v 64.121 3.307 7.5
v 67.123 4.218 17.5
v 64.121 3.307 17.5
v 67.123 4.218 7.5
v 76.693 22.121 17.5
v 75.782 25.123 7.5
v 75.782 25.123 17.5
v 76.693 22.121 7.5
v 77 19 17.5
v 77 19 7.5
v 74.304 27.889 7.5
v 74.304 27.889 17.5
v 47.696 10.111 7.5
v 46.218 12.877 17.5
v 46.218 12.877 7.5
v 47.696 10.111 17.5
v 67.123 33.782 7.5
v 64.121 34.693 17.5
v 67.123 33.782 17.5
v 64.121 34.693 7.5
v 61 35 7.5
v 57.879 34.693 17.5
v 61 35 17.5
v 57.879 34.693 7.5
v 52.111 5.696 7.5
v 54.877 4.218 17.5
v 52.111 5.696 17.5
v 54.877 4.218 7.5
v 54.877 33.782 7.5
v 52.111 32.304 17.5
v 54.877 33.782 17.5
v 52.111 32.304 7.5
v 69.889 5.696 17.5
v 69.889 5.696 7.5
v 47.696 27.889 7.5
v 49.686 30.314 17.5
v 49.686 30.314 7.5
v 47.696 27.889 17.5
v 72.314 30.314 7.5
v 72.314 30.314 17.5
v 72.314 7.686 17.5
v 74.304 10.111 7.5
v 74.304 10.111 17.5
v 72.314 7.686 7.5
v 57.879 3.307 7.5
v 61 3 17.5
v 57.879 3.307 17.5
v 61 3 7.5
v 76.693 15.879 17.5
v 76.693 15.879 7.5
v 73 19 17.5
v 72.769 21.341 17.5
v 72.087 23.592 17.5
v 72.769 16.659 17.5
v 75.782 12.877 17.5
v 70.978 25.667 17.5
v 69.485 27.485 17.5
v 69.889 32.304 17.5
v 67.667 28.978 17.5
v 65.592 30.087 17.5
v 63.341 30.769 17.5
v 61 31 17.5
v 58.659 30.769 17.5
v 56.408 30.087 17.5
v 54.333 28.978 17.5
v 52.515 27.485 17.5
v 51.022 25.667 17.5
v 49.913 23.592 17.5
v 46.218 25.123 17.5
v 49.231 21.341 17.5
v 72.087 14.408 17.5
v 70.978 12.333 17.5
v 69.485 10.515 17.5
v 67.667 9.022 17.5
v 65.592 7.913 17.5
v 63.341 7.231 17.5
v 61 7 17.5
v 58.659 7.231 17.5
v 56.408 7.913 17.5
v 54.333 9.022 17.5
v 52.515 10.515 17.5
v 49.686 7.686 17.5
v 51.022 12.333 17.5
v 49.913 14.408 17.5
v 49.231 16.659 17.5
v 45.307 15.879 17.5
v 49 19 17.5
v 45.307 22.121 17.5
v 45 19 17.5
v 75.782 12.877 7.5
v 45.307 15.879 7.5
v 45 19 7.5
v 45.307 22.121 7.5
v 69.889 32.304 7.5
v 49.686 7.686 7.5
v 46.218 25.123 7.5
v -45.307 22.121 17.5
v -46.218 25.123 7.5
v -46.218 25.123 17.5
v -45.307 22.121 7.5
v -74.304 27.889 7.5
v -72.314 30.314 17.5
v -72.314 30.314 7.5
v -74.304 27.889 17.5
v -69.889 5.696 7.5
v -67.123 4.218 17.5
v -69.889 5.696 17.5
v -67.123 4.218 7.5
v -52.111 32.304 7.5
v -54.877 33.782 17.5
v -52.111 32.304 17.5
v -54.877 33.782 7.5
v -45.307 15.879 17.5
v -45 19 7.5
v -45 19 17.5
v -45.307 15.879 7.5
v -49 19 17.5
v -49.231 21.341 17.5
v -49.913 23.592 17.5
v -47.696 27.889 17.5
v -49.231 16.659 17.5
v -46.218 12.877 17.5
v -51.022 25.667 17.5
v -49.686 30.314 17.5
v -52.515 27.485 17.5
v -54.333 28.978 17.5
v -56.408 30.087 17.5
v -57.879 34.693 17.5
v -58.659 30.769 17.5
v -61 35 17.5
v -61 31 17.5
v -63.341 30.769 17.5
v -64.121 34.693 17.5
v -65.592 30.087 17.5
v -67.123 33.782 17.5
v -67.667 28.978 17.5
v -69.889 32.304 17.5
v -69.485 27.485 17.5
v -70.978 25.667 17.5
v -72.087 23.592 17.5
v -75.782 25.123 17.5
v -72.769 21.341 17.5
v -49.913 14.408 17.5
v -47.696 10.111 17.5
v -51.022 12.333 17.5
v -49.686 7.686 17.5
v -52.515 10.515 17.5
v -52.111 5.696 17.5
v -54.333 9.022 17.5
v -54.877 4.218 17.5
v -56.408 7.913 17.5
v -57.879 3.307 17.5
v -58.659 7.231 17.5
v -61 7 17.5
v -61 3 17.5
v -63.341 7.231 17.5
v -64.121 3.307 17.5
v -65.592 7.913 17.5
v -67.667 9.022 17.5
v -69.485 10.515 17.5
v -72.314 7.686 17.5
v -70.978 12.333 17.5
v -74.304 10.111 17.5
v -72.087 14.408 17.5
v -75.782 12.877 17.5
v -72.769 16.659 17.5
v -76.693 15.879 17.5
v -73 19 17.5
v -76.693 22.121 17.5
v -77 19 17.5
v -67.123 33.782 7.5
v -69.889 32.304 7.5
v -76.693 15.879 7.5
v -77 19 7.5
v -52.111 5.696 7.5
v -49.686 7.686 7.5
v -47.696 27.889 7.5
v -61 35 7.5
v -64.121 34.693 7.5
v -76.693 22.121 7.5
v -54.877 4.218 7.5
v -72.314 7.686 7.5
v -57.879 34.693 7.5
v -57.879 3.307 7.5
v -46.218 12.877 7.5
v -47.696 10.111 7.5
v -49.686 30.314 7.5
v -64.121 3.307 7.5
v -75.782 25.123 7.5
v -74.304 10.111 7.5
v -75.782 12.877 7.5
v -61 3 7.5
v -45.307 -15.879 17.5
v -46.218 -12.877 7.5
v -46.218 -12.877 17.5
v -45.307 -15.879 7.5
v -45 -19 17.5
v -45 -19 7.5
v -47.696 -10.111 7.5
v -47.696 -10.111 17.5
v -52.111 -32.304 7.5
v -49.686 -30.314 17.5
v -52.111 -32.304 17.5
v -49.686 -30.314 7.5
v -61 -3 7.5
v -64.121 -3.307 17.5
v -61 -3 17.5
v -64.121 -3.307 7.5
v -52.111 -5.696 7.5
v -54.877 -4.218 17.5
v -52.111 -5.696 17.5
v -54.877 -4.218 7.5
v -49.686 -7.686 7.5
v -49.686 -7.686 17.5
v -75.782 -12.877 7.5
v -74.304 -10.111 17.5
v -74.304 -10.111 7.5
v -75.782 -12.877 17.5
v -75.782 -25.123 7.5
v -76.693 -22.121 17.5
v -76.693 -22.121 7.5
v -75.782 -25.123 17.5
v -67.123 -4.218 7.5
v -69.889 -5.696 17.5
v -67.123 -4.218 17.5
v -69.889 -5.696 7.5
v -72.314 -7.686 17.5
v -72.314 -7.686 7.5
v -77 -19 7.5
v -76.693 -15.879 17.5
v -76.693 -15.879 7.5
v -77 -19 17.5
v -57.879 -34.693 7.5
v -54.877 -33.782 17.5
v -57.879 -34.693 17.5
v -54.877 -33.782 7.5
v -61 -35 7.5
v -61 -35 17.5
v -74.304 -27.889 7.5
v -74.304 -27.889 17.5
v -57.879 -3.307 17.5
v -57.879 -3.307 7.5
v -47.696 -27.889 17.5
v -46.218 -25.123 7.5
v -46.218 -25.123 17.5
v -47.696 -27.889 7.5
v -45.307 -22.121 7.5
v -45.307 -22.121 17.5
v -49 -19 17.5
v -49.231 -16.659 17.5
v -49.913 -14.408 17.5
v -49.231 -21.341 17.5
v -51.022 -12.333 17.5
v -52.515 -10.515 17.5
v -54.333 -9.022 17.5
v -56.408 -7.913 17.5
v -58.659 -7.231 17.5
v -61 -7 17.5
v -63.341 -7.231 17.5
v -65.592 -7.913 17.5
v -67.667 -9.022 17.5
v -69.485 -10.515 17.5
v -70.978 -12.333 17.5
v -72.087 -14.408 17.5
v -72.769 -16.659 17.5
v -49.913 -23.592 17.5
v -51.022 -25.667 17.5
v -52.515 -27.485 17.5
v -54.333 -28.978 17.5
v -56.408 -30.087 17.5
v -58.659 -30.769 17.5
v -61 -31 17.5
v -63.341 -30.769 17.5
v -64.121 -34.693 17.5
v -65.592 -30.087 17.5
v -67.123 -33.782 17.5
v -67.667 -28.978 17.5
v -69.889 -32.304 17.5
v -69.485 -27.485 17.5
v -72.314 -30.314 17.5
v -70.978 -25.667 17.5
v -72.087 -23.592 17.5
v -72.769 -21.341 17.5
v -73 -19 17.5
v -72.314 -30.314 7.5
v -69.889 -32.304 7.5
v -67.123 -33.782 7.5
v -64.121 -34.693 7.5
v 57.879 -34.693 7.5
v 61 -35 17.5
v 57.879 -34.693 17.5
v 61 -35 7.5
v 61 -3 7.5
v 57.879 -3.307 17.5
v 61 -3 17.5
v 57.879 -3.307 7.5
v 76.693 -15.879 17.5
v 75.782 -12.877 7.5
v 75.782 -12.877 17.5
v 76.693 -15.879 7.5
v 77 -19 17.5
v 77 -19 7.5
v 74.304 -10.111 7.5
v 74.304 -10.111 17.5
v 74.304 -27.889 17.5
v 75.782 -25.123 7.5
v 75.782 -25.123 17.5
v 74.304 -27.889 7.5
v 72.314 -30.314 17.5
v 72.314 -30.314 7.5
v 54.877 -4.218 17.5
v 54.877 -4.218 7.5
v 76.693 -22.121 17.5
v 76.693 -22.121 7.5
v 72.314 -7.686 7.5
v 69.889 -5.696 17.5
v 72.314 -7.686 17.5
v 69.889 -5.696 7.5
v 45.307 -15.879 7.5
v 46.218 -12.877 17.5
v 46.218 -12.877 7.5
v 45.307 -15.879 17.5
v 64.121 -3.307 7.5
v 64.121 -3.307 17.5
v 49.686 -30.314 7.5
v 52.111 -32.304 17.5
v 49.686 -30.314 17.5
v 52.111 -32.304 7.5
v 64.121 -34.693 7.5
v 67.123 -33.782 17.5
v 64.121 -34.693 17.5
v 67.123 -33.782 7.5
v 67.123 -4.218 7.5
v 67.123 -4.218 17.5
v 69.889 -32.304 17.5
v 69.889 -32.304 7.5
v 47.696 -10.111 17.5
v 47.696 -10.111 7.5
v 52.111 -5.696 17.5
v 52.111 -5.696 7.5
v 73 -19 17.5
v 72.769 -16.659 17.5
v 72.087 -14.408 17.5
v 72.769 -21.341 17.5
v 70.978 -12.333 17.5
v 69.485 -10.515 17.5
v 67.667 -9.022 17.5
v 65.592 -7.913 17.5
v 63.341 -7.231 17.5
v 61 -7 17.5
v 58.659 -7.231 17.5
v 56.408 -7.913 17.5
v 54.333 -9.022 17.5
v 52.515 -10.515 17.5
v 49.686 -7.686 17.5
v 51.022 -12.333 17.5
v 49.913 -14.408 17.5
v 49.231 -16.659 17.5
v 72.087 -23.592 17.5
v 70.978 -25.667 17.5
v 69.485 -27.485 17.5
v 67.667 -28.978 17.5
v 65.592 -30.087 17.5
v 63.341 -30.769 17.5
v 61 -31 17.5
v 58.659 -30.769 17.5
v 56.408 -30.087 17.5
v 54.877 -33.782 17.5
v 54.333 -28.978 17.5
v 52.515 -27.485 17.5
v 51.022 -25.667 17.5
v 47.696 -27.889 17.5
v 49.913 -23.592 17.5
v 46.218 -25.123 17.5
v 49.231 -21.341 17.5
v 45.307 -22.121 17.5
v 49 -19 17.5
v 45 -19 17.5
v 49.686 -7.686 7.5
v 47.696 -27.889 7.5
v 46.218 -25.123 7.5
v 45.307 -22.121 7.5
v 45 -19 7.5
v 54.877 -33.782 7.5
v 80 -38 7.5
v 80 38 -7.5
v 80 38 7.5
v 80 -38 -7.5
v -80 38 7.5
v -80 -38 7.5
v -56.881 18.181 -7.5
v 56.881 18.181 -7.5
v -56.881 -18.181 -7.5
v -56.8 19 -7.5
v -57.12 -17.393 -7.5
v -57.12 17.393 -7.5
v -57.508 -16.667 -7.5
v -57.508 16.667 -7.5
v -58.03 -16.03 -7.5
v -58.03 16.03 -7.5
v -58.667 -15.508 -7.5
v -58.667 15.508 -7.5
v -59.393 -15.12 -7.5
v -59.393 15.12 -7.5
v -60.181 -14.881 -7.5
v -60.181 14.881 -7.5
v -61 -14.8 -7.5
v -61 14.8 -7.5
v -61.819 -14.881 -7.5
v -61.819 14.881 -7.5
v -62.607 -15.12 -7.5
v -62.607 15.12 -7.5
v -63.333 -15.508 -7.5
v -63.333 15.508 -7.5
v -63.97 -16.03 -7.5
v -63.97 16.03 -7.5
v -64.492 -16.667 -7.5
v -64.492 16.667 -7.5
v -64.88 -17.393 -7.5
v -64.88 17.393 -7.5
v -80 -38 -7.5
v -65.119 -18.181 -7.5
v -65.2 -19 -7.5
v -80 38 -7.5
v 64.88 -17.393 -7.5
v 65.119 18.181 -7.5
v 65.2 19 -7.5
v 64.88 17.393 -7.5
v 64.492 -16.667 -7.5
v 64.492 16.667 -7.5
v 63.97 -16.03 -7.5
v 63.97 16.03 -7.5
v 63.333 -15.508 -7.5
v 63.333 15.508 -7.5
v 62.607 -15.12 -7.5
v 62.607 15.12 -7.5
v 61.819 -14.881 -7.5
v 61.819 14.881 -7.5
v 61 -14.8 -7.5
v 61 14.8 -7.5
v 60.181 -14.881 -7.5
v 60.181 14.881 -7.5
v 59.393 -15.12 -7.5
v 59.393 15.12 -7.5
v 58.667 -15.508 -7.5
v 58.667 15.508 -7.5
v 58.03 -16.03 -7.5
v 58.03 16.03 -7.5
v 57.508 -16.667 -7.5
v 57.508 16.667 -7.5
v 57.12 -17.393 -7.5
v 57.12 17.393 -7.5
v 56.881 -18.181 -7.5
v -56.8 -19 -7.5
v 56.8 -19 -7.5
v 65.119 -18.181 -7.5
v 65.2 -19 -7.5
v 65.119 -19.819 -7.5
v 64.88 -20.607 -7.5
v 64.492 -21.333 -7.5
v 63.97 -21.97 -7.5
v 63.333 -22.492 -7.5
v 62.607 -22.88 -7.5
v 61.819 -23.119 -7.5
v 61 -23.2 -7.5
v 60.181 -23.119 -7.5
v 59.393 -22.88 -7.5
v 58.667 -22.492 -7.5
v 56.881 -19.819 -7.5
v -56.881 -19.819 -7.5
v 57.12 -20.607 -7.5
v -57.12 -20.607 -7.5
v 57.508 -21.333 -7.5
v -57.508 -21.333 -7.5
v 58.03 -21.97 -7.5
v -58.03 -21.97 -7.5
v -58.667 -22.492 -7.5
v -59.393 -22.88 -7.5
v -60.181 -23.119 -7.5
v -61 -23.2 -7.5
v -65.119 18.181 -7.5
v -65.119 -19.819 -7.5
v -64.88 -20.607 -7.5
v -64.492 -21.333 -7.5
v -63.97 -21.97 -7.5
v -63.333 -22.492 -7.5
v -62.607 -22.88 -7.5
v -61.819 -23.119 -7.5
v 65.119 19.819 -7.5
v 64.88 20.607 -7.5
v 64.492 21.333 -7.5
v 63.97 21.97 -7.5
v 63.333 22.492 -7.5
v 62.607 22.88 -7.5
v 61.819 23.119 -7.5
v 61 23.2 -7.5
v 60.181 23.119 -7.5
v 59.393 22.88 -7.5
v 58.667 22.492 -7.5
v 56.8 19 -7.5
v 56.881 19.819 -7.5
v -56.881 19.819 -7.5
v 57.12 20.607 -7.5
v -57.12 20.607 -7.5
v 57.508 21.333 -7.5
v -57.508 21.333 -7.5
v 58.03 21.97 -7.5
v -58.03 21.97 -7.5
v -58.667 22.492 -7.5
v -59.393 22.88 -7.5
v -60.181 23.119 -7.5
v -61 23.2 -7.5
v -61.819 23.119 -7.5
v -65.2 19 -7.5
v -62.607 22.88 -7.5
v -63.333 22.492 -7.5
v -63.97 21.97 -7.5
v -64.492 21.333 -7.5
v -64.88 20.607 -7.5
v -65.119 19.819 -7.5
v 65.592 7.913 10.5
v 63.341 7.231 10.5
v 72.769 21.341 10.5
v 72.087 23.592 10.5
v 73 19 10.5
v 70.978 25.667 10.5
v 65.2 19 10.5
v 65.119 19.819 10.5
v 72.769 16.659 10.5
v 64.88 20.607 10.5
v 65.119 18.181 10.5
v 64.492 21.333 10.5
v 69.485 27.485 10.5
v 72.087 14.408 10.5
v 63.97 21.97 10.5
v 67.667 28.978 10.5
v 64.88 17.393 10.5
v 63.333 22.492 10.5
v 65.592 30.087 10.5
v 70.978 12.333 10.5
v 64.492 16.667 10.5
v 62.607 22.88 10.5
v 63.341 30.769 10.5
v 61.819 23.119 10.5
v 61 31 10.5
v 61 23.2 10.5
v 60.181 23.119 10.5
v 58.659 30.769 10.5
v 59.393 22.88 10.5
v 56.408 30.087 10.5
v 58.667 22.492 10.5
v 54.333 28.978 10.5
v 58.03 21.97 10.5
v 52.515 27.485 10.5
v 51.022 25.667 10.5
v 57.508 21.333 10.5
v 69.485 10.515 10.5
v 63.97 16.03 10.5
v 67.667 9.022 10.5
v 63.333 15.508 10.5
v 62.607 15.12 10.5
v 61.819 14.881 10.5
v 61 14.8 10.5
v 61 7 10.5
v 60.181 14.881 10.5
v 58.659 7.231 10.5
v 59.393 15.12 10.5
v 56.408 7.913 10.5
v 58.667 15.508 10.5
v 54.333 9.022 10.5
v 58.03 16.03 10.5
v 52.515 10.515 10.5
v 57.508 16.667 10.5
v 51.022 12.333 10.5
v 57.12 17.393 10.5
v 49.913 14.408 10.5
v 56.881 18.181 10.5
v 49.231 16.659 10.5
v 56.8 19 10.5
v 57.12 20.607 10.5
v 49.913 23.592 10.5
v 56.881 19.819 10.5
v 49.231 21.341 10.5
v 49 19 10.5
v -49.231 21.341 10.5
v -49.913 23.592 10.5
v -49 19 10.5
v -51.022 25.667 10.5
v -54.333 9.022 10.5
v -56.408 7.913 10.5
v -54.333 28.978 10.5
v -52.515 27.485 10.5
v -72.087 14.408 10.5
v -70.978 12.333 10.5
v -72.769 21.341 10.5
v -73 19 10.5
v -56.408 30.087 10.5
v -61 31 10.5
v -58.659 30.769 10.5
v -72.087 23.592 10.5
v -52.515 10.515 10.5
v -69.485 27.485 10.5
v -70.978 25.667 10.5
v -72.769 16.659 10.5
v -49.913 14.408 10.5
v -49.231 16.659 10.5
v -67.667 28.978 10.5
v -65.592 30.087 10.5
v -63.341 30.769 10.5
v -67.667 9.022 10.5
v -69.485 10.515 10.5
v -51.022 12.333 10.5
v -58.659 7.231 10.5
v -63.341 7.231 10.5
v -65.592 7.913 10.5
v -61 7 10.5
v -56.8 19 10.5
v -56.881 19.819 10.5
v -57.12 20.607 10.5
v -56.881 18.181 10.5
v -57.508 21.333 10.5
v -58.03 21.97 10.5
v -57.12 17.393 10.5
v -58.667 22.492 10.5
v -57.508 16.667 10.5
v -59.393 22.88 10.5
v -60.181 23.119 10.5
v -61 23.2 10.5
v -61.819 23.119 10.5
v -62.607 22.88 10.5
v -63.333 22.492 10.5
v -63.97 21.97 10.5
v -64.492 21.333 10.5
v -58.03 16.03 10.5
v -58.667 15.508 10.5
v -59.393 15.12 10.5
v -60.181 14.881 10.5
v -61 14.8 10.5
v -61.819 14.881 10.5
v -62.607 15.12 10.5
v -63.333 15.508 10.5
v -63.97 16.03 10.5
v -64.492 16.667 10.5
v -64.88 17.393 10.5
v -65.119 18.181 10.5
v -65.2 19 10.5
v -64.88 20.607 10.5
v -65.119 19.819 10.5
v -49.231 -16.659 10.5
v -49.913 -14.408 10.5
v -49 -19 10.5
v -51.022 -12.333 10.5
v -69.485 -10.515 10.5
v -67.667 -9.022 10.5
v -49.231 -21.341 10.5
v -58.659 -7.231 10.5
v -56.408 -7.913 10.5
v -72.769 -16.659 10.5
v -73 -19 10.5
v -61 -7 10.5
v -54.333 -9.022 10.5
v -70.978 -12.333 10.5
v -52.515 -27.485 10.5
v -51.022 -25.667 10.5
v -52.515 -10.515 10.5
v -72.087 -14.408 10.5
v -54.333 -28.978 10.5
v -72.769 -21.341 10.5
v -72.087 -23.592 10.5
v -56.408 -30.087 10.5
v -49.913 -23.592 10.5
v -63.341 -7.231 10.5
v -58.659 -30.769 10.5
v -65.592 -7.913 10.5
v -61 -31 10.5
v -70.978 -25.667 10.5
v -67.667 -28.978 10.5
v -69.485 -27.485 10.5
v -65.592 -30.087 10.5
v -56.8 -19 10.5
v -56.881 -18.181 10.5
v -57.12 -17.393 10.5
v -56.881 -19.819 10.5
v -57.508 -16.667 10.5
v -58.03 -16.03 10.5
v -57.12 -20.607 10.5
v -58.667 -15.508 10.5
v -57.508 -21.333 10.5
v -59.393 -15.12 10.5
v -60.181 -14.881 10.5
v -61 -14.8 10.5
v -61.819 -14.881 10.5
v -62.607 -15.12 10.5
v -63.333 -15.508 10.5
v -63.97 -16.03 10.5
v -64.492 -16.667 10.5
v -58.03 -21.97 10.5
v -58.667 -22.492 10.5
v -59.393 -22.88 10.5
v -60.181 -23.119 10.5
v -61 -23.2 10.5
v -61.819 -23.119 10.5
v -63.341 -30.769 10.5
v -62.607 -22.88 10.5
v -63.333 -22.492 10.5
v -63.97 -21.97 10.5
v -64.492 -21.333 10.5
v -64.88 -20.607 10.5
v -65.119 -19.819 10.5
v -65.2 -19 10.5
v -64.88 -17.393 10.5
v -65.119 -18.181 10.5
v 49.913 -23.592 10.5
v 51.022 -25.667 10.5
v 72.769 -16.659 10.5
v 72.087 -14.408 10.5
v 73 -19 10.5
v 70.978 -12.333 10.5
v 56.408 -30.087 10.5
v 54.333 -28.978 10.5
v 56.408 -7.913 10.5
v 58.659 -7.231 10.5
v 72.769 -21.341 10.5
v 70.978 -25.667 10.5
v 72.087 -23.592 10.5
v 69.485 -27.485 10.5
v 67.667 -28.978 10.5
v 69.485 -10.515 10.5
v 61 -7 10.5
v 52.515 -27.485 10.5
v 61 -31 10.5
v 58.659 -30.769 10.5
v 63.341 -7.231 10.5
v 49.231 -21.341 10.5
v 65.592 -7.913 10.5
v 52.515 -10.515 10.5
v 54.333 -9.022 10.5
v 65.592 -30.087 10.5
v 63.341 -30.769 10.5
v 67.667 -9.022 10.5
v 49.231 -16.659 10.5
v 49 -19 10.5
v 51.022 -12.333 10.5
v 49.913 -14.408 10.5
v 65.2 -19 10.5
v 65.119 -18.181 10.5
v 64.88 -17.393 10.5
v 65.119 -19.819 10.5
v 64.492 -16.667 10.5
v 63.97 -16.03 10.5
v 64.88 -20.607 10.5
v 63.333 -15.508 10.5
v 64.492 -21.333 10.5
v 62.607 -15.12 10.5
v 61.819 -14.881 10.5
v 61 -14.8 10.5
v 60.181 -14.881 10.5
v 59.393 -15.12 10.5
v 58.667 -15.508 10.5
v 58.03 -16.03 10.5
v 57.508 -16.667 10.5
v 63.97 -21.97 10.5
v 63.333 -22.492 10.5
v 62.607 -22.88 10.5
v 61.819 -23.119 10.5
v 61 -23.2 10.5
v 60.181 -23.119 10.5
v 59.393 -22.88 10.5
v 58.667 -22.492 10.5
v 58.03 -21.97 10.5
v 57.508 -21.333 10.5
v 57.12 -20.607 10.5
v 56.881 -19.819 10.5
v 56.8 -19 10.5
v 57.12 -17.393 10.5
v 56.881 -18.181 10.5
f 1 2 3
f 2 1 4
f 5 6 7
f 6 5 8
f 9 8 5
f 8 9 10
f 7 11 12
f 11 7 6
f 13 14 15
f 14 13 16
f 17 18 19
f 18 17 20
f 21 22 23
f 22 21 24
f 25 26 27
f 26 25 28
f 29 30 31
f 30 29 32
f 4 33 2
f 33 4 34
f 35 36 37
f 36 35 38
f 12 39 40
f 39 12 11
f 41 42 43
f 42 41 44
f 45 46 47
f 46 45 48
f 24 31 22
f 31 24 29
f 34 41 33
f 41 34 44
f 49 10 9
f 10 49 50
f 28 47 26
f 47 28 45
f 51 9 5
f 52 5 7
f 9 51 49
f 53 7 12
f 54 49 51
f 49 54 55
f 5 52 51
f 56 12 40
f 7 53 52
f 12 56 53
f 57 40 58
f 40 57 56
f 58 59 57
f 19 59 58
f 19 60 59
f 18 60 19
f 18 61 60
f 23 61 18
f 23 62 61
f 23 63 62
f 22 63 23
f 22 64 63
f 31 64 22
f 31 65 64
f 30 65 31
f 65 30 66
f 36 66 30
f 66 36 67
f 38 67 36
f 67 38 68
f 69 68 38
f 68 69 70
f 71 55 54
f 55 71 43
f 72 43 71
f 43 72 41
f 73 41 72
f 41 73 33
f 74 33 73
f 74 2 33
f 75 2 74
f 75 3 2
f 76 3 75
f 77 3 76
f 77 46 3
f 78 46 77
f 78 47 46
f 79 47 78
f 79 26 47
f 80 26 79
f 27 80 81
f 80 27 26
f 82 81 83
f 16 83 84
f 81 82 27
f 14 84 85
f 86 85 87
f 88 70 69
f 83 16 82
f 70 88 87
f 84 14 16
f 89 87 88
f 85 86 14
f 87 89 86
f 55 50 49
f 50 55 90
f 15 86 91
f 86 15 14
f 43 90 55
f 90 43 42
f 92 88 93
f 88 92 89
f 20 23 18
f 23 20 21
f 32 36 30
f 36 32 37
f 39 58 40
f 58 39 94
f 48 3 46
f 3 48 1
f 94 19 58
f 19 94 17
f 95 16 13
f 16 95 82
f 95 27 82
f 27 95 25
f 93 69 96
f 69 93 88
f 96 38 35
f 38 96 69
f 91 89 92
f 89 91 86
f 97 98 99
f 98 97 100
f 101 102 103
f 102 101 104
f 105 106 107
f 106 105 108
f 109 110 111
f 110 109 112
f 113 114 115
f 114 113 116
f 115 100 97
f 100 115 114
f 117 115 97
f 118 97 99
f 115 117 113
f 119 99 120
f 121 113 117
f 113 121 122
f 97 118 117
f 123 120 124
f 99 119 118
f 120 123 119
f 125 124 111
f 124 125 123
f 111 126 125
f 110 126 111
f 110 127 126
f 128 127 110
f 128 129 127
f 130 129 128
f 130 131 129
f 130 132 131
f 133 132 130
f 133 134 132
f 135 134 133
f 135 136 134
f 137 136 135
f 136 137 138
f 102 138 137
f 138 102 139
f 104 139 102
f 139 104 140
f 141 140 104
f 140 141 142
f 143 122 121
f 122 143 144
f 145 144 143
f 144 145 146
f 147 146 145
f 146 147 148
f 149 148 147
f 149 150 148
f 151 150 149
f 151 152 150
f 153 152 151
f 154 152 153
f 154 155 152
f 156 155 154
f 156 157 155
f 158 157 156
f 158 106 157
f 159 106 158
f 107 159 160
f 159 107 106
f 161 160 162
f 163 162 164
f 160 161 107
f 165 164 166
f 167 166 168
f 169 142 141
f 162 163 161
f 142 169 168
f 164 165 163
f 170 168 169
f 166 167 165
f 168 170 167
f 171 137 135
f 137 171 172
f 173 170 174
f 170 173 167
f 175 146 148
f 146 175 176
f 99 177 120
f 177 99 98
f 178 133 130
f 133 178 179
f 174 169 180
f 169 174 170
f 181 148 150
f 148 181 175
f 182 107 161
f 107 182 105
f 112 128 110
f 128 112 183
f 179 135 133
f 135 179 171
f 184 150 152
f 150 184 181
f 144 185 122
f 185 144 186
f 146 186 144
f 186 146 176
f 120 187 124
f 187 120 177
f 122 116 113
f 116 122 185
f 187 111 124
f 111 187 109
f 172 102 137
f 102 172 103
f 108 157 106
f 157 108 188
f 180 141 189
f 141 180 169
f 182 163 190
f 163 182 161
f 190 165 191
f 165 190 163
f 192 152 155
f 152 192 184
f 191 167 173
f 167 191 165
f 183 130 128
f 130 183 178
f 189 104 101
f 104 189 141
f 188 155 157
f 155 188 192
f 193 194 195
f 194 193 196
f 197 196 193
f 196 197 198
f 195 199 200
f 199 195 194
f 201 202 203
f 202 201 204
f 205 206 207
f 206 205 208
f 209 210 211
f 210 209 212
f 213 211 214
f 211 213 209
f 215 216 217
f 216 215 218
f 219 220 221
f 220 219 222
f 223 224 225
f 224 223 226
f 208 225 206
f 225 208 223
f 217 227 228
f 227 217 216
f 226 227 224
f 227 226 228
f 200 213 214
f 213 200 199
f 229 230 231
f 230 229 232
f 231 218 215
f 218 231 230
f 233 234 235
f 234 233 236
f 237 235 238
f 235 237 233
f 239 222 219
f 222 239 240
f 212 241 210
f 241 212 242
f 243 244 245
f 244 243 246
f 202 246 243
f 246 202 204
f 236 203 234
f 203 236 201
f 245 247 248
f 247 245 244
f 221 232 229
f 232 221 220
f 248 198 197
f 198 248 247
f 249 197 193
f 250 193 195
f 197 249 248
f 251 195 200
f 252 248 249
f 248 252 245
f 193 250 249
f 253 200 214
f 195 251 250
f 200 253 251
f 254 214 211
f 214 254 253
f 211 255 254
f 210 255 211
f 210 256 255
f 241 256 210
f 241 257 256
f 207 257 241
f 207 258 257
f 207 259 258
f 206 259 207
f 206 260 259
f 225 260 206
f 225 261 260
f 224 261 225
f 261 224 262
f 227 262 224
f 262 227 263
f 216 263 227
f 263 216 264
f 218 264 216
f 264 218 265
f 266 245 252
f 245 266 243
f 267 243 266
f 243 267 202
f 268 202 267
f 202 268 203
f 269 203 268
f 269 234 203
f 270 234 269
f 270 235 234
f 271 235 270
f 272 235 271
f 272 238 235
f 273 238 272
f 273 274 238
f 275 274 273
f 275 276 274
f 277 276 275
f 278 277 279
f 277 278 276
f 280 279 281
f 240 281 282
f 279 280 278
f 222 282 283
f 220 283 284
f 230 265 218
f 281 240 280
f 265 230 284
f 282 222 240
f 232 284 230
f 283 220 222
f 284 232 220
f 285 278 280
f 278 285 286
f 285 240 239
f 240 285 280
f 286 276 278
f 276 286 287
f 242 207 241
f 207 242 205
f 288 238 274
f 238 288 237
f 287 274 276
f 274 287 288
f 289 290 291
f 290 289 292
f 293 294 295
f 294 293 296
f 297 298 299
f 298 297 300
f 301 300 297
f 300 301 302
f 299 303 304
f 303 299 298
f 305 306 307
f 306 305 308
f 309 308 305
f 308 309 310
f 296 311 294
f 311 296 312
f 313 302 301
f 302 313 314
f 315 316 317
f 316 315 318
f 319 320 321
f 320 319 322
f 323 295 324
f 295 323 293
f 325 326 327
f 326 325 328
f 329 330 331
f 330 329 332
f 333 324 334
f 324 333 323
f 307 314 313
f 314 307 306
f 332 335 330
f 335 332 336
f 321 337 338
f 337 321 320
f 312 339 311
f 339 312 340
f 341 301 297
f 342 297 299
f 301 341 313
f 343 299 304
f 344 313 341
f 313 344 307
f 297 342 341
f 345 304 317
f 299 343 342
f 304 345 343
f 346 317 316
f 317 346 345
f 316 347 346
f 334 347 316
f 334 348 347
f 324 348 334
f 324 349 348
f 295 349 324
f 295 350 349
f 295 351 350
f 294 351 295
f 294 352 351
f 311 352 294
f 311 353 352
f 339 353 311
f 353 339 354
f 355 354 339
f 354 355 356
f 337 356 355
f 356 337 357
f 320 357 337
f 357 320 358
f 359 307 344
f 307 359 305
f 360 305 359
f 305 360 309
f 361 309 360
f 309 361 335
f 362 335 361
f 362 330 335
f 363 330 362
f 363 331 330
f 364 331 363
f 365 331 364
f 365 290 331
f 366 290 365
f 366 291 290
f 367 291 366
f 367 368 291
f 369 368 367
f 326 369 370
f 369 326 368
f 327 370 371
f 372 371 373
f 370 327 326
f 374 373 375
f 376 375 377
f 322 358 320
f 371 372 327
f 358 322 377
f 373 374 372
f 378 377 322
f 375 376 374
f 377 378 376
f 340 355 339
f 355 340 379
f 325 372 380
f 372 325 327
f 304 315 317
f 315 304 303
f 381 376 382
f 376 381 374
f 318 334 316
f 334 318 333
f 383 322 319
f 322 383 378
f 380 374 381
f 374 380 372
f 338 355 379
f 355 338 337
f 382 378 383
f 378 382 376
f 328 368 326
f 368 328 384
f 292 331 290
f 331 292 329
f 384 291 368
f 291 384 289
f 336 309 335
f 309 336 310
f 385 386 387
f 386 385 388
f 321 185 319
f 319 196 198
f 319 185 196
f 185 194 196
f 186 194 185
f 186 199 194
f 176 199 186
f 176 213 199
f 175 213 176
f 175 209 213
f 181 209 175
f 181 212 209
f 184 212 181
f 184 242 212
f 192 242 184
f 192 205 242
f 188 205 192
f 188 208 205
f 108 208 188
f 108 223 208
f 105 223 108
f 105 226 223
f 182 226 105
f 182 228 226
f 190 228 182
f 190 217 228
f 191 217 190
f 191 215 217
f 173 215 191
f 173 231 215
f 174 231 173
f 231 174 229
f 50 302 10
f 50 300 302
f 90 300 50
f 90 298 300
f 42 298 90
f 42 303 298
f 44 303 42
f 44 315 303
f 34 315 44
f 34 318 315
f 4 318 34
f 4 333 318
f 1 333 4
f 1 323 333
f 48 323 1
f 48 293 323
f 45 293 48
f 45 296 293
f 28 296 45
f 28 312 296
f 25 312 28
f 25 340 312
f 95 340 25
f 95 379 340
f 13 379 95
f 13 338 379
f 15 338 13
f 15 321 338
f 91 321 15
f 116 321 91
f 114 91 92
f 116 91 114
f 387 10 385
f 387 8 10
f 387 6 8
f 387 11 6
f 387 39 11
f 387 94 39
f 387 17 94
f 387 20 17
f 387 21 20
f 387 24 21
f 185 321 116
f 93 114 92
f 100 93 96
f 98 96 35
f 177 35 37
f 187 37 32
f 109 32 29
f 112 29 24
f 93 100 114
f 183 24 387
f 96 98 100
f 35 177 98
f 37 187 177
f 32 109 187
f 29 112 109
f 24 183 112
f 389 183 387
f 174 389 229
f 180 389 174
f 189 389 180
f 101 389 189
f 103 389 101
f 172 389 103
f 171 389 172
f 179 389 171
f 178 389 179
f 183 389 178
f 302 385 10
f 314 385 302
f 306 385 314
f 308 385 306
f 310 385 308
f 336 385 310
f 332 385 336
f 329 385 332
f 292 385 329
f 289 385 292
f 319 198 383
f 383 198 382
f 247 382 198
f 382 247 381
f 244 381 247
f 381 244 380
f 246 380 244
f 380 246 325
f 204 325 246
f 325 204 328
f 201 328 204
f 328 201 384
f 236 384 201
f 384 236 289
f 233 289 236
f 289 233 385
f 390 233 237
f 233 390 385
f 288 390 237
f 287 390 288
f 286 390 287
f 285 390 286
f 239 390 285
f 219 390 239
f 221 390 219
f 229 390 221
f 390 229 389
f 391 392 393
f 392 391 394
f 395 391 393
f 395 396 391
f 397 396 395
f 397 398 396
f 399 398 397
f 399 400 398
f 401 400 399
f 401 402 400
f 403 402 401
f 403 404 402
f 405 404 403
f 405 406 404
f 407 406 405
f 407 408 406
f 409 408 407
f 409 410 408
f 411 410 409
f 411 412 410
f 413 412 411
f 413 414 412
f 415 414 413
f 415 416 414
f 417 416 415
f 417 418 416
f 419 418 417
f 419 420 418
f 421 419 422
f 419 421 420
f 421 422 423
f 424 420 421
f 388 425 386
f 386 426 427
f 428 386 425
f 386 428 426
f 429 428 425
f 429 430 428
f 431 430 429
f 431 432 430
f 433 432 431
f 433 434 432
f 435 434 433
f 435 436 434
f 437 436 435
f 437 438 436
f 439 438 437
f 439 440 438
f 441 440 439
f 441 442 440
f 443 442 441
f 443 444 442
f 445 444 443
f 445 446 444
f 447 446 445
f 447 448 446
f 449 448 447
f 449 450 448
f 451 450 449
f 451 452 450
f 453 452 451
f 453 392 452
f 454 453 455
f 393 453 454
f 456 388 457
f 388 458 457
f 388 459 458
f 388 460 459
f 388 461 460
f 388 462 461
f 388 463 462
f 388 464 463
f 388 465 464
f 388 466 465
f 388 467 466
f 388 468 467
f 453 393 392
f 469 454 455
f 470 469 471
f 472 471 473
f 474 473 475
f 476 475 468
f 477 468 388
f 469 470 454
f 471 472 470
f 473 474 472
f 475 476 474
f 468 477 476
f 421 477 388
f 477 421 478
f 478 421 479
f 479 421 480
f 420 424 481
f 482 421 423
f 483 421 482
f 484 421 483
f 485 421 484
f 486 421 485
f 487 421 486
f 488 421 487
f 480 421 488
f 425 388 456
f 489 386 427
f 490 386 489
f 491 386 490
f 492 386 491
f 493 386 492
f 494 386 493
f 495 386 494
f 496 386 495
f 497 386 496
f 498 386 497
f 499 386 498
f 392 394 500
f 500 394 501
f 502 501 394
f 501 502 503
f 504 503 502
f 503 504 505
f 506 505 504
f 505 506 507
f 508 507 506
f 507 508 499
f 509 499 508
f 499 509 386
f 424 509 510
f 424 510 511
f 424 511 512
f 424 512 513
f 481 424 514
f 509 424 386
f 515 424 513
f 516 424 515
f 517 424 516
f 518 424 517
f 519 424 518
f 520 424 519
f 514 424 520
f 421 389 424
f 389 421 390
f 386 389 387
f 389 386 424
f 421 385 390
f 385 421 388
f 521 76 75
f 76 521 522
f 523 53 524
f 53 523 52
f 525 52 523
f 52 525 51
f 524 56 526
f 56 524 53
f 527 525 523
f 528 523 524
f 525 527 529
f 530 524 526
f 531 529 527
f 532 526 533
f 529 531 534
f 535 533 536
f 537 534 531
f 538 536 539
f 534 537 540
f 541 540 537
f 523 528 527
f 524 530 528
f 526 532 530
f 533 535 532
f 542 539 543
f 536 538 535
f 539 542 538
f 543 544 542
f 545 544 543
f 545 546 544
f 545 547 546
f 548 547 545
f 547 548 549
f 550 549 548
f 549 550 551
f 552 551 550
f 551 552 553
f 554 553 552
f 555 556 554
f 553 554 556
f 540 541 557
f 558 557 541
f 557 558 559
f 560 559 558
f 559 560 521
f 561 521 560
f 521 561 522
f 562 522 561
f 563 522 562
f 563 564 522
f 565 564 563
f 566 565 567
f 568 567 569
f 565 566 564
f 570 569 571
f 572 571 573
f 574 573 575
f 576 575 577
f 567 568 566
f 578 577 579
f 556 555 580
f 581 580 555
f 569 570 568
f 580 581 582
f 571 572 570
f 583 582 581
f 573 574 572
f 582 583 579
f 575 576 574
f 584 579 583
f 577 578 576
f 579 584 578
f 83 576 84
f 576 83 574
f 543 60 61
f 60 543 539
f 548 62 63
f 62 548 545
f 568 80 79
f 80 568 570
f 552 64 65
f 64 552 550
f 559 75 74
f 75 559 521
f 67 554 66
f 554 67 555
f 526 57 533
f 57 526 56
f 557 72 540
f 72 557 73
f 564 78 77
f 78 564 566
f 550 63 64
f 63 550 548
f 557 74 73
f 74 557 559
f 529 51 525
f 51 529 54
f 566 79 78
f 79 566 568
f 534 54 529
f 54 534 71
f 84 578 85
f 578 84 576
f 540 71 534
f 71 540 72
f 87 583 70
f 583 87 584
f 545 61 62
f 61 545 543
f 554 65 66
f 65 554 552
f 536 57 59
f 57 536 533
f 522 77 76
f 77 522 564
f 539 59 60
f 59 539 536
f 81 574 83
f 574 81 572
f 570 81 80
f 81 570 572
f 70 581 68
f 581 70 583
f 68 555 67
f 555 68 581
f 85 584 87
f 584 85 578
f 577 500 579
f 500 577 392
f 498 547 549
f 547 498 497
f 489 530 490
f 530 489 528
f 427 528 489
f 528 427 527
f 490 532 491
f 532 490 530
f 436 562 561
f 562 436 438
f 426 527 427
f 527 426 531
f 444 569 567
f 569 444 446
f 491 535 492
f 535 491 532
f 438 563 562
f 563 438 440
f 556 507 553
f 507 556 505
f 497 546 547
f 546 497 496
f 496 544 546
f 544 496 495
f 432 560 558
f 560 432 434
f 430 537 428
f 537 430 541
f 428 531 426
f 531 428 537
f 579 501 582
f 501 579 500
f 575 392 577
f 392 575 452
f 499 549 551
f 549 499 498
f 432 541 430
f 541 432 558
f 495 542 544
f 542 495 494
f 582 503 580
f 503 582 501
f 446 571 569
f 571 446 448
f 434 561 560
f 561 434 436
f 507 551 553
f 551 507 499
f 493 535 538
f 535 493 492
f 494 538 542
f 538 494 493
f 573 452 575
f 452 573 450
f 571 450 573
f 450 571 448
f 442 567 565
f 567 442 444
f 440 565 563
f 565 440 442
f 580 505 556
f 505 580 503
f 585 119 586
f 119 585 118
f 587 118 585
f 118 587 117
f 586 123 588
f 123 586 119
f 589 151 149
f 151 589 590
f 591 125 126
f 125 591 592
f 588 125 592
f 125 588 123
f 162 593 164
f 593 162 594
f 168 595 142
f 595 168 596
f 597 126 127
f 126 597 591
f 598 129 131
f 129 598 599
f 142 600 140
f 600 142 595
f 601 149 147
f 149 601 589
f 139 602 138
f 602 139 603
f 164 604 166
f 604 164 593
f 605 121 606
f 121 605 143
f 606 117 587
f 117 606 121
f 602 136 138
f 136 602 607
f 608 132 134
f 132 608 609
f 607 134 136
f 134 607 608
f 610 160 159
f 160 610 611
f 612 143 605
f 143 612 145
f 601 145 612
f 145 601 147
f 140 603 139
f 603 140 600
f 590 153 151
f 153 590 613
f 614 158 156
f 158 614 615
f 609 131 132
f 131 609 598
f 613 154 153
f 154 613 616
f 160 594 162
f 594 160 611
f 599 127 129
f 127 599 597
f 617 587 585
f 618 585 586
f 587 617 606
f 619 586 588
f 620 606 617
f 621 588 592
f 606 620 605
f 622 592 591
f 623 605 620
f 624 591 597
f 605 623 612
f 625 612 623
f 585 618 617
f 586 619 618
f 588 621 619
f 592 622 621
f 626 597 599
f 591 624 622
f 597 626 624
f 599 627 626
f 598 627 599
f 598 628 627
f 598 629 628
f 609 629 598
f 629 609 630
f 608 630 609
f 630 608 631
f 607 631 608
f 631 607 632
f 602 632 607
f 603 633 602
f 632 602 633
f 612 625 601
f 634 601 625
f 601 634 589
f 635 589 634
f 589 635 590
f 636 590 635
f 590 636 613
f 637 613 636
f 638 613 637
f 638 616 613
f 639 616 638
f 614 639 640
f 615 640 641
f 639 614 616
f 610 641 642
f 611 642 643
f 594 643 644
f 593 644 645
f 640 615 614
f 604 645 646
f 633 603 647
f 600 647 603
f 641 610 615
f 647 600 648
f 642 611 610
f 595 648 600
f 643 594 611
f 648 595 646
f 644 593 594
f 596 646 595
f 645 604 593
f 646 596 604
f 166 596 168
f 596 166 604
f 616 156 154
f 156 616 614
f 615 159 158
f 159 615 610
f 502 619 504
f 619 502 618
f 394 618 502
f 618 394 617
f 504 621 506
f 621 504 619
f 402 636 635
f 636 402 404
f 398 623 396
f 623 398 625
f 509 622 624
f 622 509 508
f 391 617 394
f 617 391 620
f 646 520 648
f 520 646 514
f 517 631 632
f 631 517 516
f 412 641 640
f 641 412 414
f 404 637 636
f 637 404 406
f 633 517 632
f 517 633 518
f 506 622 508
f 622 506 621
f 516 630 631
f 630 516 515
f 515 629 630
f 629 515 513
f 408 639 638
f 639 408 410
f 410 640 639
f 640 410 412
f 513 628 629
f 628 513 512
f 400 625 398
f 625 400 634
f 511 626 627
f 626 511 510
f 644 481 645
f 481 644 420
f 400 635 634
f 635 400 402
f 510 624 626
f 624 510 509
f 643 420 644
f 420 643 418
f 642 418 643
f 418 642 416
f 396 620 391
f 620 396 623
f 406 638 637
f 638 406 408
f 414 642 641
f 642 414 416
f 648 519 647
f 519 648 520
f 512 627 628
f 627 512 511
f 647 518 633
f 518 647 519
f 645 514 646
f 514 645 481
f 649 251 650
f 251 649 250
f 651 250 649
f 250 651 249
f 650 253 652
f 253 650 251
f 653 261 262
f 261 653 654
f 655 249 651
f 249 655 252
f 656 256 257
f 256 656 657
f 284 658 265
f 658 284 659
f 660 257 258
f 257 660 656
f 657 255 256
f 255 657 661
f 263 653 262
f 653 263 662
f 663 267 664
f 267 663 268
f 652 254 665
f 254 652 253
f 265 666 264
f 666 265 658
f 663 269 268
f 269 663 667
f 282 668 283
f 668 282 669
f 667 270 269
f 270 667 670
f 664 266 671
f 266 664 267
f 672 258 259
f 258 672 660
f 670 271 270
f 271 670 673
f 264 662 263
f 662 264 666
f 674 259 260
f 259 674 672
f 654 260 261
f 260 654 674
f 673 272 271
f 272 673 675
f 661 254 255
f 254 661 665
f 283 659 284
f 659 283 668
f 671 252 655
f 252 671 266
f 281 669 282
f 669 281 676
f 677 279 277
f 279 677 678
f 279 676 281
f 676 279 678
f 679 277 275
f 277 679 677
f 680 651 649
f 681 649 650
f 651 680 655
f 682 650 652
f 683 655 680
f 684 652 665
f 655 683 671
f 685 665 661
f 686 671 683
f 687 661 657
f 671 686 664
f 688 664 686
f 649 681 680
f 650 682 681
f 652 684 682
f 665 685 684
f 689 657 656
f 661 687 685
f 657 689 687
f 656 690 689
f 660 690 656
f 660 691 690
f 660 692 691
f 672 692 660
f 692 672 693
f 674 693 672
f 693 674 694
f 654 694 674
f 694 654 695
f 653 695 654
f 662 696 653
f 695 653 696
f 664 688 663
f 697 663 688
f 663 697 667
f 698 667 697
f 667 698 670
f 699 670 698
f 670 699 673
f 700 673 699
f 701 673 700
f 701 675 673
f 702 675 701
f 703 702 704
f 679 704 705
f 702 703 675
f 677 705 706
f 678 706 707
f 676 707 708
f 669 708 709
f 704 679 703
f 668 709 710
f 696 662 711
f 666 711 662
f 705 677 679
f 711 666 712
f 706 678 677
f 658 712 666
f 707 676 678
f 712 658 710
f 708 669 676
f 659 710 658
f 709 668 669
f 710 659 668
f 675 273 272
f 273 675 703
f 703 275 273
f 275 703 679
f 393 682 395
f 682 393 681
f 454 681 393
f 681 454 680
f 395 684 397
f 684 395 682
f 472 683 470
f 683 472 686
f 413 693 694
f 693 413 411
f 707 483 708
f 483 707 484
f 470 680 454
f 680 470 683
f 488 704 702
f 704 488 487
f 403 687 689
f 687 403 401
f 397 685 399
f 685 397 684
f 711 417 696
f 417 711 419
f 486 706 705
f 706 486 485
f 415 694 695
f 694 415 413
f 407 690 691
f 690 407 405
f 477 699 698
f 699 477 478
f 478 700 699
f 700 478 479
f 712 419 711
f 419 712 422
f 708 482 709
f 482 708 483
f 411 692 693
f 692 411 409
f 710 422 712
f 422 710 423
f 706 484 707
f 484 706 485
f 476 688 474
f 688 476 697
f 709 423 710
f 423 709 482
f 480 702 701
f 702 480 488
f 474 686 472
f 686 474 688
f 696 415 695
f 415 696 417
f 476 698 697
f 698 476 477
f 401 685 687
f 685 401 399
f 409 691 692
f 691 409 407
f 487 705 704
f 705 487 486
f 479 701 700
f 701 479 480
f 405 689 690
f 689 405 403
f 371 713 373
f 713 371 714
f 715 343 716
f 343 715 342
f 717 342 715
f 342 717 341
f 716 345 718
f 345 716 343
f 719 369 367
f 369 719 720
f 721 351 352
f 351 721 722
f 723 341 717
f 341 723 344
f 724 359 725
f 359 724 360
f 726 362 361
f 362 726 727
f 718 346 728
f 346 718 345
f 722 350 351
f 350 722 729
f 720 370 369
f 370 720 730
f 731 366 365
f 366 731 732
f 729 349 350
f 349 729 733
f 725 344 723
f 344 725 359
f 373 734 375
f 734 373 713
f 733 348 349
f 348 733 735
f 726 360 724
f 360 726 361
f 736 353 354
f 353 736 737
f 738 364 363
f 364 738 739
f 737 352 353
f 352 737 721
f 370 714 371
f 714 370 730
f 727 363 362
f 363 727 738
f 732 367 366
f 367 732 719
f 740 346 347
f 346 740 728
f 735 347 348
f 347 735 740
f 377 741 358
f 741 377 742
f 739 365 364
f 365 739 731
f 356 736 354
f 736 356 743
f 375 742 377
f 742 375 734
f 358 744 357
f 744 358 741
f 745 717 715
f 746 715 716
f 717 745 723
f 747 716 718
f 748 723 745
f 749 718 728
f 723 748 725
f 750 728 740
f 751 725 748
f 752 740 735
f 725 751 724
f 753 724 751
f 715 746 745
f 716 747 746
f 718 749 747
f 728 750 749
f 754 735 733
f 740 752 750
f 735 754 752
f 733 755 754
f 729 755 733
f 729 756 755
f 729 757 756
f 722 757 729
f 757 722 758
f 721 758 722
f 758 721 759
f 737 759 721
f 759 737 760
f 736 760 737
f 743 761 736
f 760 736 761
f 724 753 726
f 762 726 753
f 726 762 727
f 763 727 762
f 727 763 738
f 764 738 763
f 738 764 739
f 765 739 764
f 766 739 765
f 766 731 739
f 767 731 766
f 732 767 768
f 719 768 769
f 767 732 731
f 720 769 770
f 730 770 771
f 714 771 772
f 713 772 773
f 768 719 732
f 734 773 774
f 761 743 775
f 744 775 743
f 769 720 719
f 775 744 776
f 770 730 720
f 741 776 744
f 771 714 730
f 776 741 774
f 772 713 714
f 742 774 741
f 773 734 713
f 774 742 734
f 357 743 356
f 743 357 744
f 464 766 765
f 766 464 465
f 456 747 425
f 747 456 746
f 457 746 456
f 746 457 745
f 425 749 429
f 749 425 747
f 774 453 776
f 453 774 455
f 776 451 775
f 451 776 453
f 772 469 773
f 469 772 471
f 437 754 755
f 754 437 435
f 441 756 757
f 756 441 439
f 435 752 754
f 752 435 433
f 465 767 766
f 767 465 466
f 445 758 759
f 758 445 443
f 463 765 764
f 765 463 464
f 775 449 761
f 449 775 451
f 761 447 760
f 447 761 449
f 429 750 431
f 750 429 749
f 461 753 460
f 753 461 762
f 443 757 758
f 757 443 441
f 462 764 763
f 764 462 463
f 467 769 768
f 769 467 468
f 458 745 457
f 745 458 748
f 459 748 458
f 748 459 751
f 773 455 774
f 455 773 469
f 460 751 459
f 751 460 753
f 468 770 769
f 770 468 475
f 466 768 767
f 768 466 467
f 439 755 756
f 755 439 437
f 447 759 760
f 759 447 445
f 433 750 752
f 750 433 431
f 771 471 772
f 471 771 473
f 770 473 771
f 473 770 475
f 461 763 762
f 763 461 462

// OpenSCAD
$fn = 32;

// ----------------------------------------------------------------------
// Socket pad plate
// bosses with counterbored sockets for the screws
// ----------------------------------------------------------------------

// --- parameters (mm) ---
base_t = 15;            // base plate thickness
boss_h = 10;            // boss height above the base plate
boss_d = 32;            // boss diameter
socket_d = 24;          // socket diameter
socket_depth = 7;       // socket depth from the boss face
bolt_d = 8.4;           // screw clearance hole through the socket floor
plate = [160, 76, 15];  // overall size (x, y, z)
edge = 19;              // boss centre offset from the plate edge
pads = 4;               // boss count, one per corner

// --- derived feature positions (mm) ---
height = base_t + boss_h;        // = 25   overall height of the part
corner_x = plate[0] / 2 - edge;  // = 61   boss centre X
corner_y = plate[1] / 2 - edge;  // = 19   boss centre Y
feature_centers = [
  [corner_x, corner_y],
  [-corner_x, corner_y],
  [-corner_x, -corner_y],
  [corner_x, -corner_y]
];   // boss centres: sockets, holes and the pads themselves are placed from here

// base plate, bosses on feature_centers, socket + through hole in each
difference() {
  union() {
    cube(plate, center = true);
    for (centre = feature_centers)
      translate([centre[0], centre[1], plate[2] / 2 - 1])
        cylinder(d = boss_d, h = boss_h + 1);
  }
  for (centre = feature_centers) {
    translate([centre[0], centre[1], plate[2] / 2 + boss_h - socket_depth])
      cylinder(d = socket_d, h = socket_depth + 1);
    translate([centre[0], centre[1], -height])
      cylinder(d = bolt_d, h = 2 * height + 2);  // through the socket floor
  }
}
